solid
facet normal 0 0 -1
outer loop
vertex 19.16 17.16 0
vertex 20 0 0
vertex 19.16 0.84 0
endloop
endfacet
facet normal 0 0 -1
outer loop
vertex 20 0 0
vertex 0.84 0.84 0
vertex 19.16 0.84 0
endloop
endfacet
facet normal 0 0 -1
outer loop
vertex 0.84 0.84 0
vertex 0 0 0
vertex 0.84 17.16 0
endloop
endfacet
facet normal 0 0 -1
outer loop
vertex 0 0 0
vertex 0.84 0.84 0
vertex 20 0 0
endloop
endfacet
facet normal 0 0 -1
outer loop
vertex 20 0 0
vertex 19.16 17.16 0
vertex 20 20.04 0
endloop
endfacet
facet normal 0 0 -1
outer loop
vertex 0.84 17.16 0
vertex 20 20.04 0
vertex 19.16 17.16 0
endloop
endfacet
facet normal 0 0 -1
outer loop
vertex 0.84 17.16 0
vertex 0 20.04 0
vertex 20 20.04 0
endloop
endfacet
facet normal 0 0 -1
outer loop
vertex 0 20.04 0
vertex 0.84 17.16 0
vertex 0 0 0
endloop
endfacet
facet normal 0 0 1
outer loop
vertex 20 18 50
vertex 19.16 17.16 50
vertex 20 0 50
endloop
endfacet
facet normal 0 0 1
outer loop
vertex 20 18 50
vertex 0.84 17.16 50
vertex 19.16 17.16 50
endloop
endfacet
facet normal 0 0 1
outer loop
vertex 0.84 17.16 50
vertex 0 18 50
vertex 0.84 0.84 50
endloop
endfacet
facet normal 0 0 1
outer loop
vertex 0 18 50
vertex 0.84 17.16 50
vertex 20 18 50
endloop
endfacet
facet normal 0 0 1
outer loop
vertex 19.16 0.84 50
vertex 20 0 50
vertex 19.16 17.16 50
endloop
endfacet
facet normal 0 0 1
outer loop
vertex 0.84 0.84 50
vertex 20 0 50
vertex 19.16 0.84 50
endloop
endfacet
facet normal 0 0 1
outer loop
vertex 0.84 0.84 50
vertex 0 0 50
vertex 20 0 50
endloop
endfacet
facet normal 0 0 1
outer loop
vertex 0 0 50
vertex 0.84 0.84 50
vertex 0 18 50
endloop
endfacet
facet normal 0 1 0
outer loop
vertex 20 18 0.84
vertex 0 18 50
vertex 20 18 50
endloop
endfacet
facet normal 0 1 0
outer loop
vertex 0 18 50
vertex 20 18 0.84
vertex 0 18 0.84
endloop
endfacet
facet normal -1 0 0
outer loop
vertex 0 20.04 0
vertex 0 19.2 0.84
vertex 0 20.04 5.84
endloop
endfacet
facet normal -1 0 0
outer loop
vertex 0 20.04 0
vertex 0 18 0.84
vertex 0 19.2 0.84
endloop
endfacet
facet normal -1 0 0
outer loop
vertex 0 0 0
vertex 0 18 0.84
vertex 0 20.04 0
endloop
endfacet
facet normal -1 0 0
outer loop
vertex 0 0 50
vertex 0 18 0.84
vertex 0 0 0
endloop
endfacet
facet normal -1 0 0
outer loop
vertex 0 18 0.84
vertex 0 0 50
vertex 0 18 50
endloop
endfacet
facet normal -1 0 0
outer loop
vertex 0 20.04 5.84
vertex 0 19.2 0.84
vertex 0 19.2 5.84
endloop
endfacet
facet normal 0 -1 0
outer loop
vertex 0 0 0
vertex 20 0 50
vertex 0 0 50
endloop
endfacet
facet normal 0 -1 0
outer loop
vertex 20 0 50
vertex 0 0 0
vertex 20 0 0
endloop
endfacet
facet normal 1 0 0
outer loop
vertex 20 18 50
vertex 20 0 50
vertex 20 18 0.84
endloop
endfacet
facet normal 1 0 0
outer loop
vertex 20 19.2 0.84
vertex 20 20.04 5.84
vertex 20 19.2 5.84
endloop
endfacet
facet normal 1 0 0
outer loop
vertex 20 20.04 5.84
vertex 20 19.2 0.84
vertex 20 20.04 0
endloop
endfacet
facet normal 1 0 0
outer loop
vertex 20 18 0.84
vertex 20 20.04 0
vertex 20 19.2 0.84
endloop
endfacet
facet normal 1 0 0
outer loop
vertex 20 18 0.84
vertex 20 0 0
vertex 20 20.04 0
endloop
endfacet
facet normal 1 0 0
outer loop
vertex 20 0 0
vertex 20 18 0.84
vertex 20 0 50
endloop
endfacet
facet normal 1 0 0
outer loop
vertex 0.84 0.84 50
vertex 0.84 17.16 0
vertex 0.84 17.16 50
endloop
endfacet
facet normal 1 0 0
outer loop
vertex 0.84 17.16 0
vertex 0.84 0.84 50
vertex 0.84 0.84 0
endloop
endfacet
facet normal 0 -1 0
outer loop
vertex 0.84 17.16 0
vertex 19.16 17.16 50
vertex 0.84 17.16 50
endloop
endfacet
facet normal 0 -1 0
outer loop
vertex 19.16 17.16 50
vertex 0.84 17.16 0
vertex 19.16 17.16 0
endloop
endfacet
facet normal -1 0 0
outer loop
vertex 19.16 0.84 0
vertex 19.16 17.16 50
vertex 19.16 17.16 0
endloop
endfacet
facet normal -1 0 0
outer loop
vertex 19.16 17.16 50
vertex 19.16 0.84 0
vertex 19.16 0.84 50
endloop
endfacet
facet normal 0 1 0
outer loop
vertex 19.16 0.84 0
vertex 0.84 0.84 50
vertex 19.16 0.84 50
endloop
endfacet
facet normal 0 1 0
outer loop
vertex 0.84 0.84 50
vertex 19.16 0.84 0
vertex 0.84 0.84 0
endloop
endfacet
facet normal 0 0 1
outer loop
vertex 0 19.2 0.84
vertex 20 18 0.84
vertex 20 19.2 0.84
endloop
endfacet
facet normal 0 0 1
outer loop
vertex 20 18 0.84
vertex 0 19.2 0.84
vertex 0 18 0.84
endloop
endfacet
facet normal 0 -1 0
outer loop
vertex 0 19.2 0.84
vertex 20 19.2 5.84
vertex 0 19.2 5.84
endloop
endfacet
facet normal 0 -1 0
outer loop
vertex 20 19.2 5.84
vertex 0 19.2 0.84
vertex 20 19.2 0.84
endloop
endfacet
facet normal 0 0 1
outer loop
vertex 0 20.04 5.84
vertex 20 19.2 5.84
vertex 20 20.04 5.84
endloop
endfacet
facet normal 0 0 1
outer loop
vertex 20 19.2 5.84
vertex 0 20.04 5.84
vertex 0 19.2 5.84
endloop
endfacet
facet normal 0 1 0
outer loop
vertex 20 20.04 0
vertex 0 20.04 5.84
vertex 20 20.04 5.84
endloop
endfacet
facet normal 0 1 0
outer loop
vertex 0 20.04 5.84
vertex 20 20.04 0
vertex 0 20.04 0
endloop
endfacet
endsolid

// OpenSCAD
cutWidth = 40.4;
cutHeight = 12.504;

coverLength = 50;
coverWidth = 20;
coverHeight = 18;
coverThickness = 0.84;
coverHookLength = 5;
coverHookSpace = 1.2;

module openFrame() {
    difference() {
        union() {
            import("Inkplate_6_Case_Bottom.stl");
            
            translate([2, 32, -11.8])
            color("red")
            cube([100, 82, 1]);
            
            translate([20, 62, -11.8])
            color("green")
            cube([112, 62, 1]);
        }
        
        translate([57.4, 108.595, -15])
        cube([cutWidth, cutHeight, 10]);
        
        translate([30, 100, -10.799])
        cube([30, 21.09, 10]);
        
        translate([100, 100, -10.799])
        cube([30, 21.09, 10]);
        
        translate([3.41, 75, -10.799])
        cube([30, 21.09, 10]);
        
        translate([3.41, 32, -10.799])
        cube([30, 21.09, 10]);
    }
}

module sensorCover() {
    linear_extrude(coverLength)
    difference() {
        square([coverWidth, coverHeight]);
        
        offset(-coverThickness)
        square([coverWidth, coverHeight]);
    }
    
    translate([0, coverHeight, 0])
    cube([coverWidth, coverHookSpace, coverThickness]);
    
    translate([0, coverHeight + coverHookSpace, 0])
    cube([coverWidth, coverThickness, coverThickness + coverHookLength]);
}

sensorCover();
